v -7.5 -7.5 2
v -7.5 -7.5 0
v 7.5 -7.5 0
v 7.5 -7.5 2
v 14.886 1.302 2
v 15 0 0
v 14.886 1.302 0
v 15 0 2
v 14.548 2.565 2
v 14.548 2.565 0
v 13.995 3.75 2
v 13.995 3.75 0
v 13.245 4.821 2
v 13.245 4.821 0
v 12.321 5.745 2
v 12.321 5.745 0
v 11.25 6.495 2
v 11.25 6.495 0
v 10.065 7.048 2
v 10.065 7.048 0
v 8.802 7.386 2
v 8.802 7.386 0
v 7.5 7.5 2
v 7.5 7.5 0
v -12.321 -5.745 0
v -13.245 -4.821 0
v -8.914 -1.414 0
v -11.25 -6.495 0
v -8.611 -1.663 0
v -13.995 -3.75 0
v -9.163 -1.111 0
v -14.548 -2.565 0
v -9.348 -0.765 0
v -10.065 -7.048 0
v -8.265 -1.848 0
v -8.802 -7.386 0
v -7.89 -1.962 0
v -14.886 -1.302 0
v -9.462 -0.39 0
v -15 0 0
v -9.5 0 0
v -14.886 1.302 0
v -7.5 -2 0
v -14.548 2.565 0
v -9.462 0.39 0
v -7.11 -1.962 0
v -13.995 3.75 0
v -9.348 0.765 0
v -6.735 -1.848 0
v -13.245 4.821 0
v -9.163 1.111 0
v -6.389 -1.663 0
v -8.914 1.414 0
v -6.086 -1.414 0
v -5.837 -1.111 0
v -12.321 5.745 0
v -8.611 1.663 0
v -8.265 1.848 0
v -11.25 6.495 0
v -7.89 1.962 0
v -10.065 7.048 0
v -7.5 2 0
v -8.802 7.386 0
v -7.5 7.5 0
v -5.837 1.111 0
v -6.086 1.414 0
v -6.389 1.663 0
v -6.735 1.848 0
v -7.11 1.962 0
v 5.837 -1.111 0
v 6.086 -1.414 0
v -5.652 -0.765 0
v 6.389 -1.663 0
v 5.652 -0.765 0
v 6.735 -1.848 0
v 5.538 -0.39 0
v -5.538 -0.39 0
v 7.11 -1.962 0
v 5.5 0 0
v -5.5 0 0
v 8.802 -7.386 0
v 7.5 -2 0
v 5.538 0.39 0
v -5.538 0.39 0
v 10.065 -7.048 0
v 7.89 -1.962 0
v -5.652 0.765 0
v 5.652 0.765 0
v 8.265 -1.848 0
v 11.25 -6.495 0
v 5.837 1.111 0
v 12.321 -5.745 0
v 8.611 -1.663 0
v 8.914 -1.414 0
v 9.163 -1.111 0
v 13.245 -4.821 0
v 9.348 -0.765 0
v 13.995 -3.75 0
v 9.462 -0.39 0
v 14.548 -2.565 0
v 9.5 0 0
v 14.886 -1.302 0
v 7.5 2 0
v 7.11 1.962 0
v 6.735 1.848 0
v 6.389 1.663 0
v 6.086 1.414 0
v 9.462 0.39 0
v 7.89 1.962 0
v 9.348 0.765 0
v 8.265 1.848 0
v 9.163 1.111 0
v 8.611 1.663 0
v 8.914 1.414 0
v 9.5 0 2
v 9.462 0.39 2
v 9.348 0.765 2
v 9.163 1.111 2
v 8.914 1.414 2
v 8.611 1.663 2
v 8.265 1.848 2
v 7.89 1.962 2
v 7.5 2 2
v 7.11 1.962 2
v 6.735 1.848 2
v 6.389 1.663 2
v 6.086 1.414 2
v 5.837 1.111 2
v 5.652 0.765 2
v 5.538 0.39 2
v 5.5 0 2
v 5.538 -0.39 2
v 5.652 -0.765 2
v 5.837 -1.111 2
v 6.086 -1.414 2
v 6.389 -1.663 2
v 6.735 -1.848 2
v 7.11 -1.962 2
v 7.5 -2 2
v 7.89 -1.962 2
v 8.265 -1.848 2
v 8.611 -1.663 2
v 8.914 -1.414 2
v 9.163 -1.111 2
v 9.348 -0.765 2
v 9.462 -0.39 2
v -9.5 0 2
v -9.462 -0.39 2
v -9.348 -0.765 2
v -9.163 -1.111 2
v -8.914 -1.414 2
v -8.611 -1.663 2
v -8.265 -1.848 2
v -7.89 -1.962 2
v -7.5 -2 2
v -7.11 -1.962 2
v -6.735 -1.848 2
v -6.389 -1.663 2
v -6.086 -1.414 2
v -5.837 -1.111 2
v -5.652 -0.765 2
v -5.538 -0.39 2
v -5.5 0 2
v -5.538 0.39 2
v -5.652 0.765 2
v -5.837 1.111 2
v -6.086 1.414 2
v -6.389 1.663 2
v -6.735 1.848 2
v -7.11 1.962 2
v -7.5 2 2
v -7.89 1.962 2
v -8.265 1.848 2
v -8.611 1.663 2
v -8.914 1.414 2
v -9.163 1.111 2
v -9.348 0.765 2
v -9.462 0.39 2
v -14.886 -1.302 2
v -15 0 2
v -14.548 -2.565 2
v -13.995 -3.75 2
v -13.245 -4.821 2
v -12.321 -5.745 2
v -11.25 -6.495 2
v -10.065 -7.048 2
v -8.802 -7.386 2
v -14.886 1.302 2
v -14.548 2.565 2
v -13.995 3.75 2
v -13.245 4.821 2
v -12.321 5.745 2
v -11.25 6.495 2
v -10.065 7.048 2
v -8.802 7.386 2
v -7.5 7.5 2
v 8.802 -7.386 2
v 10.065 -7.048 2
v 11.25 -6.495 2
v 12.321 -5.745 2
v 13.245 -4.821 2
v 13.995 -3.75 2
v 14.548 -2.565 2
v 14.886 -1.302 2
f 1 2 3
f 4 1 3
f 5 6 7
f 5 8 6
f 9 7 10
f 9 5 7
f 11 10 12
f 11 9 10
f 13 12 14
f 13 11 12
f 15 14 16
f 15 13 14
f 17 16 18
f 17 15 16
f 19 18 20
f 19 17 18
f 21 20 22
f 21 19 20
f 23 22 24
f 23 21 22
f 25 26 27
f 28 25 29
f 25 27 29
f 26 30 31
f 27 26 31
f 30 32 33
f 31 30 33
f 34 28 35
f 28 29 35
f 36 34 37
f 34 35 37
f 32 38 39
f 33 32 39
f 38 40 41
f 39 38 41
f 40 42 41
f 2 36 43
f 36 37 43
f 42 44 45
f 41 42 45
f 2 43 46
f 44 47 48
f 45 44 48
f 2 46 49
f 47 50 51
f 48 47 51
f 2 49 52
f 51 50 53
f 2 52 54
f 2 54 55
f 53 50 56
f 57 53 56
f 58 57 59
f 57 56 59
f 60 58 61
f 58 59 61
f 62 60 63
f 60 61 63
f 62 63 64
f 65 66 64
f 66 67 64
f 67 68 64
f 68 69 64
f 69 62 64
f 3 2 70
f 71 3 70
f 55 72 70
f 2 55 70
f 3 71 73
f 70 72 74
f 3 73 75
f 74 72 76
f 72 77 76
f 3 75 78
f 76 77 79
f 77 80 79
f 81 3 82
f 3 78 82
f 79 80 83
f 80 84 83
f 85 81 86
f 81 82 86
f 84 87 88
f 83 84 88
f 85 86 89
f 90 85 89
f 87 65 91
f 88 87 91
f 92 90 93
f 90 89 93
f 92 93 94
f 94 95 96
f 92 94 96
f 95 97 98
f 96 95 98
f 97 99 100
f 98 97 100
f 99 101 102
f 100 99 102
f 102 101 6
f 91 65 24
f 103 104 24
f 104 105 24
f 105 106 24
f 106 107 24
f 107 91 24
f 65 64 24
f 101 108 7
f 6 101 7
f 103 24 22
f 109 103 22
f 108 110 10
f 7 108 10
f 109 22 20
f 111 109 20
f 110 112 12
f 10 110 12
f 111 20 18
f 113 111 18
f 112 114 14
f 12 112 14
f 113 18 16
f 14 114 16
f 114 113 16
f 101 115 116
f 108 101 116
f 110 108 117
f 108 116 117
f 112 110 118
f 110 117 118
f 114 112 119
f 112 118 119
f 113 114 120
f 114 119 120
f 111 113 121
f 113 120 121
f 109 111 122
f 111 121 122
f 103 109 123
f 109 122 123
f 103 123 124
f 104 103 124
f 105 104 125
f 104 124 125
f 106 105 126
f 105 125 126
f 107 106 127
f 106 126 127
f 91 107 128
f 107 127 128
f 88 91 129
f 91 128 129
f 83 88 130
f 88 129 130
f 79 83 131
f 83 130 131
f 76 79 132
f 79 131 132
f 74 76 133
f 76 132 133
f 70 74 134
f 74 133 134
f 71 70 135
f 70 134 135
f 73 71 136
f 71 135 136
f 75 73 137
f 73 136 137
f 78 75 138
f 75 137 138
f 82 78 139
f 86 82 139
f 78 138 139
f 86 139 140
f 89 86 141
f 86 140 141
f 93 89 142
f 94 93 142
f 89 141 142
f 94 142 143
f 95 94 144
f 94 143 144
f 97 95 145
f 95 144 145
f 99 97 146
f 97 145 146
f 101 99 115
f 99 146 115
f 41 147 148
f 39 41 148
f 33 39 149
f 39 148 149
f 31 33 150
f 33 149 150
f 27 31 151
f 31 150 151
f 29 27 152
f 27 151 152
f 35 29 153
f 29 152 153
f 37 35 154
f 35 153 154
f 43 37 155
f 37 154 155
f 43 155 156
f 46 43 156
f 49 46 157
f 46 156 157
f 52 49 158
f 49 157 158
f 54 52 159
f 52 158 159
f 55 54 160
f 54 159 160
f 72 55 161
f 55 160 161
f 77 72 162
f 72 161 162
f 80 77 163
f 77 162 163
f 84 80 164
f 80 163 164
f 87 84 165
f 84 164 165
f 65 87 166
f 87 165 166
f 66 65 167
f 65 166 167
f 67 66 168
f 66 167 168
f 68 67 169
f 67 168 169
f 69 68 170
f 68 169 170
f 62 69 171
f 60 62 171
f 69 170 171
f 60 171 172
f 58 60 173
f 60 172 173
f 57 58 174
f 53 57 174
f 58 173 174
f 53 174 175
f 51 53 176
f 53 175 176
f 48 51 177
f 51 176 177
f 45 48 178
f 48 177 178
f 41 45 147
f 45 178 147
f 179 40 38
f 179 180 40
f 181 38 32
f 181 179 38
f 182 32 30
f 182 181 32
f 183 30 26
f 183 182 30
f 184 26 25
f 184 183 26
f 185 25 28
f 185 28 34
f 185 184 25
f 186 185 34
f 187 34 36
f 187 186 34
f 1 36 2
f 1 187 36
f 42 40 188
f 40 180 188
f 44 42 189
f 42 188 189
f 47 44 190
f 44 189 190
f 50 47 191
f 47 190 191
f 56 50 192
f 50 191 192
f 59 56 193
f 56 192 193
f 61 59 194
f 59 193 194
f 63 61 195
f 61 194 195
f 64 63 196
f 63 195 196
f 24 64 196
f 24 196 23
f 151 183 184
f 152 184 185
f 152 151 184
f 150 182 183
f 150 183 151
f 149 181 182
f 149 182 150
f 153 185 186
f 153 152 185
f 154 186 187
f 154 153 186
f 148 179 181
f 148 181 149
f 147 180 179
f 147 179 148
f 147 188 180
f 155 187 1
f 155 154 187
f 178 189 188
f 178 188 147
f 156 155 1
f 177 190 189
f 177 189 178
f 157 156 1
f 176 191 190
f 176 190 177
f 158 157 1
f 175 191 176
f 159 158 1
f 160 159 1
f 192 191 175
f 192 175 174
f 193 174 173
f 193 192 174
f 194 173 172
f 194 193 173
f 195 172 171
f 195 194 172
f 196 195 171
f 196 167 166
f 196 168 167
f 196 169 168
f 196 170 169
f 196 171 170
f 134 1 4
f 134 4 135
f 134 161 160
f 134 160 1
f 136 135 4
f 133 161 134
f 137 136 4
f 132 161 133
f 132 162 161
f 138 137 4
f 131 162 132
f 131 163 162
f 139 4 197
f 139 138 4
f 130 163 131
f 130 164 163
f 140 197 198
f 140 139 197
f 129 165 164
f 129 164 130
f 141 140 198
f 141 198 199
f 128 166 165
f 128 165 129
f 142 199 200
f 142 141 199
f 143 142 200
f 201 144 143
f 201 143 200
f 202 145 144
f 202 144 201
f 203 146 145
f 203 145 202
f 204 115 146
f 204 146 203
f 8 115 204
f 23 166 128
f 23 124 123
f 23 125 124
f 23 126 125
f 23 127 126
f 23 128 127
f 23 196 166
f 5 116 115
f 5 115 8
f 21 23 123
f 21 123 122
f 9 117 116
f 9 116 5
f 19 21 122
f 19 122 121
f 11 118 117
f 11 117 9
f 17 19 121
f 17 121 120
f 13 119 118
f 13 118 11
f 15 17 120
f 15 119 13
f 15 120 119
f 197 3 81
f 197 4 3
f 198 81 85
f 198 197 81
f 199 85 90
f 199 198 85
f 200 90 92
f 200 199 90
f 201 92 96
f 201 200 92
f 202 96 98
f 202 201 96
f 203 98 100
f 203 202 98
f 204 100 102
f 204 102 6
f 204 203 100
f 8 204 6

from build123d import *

# Parameters (mm, degrees)
SKETCH_1_W          = 30
SKETCH_1_H          = 15
EXTRUDE_1_DEPTH     = 2
FILLET_1_R          = 7.5
SKETCH_2_R          = 2
CUT_EXTRUDE_1_DEPTH = 2


with BuildPart() as part:
    # 草图1 → 凸台-拉伸1 (new body)
    with BuildSketch(Plane.XY):
        Rectangle(SKETCH_1_W, SKETCH_1_H)
    extrude(amount=EXTRUDE_1_DEPTH)

    # 圆角1
    fillet_1_edges = [part.edges().sort_by_distance(p)[0] for p in [
        (15, -7.5, 1),
        (-15, -7.5, 1),
        (-15, 7.5, 1),
        (15, 7.5, 1),
    ]]
    fillet(fillet_1_edges, radius=FILLET_1_R - 0.0001)  # a hair under: the kernel refuses the full size

    # 草图2 → 切除-拉伸1 (cut)
    with BuildSketch(Plane.XY.offset(2)):
        with Locations((7.5, 0)):
            Circle(SKETCH_2_R)
        with Locations(Location((-7.5, 0, 0), (0, 0, 180))):
            Circle(SKETCH_2_R)
    extrude(amount=-CUT_EXTRUDE_1_DEPTH, mode=Mode.SUBTRACT)


solid = part.part
